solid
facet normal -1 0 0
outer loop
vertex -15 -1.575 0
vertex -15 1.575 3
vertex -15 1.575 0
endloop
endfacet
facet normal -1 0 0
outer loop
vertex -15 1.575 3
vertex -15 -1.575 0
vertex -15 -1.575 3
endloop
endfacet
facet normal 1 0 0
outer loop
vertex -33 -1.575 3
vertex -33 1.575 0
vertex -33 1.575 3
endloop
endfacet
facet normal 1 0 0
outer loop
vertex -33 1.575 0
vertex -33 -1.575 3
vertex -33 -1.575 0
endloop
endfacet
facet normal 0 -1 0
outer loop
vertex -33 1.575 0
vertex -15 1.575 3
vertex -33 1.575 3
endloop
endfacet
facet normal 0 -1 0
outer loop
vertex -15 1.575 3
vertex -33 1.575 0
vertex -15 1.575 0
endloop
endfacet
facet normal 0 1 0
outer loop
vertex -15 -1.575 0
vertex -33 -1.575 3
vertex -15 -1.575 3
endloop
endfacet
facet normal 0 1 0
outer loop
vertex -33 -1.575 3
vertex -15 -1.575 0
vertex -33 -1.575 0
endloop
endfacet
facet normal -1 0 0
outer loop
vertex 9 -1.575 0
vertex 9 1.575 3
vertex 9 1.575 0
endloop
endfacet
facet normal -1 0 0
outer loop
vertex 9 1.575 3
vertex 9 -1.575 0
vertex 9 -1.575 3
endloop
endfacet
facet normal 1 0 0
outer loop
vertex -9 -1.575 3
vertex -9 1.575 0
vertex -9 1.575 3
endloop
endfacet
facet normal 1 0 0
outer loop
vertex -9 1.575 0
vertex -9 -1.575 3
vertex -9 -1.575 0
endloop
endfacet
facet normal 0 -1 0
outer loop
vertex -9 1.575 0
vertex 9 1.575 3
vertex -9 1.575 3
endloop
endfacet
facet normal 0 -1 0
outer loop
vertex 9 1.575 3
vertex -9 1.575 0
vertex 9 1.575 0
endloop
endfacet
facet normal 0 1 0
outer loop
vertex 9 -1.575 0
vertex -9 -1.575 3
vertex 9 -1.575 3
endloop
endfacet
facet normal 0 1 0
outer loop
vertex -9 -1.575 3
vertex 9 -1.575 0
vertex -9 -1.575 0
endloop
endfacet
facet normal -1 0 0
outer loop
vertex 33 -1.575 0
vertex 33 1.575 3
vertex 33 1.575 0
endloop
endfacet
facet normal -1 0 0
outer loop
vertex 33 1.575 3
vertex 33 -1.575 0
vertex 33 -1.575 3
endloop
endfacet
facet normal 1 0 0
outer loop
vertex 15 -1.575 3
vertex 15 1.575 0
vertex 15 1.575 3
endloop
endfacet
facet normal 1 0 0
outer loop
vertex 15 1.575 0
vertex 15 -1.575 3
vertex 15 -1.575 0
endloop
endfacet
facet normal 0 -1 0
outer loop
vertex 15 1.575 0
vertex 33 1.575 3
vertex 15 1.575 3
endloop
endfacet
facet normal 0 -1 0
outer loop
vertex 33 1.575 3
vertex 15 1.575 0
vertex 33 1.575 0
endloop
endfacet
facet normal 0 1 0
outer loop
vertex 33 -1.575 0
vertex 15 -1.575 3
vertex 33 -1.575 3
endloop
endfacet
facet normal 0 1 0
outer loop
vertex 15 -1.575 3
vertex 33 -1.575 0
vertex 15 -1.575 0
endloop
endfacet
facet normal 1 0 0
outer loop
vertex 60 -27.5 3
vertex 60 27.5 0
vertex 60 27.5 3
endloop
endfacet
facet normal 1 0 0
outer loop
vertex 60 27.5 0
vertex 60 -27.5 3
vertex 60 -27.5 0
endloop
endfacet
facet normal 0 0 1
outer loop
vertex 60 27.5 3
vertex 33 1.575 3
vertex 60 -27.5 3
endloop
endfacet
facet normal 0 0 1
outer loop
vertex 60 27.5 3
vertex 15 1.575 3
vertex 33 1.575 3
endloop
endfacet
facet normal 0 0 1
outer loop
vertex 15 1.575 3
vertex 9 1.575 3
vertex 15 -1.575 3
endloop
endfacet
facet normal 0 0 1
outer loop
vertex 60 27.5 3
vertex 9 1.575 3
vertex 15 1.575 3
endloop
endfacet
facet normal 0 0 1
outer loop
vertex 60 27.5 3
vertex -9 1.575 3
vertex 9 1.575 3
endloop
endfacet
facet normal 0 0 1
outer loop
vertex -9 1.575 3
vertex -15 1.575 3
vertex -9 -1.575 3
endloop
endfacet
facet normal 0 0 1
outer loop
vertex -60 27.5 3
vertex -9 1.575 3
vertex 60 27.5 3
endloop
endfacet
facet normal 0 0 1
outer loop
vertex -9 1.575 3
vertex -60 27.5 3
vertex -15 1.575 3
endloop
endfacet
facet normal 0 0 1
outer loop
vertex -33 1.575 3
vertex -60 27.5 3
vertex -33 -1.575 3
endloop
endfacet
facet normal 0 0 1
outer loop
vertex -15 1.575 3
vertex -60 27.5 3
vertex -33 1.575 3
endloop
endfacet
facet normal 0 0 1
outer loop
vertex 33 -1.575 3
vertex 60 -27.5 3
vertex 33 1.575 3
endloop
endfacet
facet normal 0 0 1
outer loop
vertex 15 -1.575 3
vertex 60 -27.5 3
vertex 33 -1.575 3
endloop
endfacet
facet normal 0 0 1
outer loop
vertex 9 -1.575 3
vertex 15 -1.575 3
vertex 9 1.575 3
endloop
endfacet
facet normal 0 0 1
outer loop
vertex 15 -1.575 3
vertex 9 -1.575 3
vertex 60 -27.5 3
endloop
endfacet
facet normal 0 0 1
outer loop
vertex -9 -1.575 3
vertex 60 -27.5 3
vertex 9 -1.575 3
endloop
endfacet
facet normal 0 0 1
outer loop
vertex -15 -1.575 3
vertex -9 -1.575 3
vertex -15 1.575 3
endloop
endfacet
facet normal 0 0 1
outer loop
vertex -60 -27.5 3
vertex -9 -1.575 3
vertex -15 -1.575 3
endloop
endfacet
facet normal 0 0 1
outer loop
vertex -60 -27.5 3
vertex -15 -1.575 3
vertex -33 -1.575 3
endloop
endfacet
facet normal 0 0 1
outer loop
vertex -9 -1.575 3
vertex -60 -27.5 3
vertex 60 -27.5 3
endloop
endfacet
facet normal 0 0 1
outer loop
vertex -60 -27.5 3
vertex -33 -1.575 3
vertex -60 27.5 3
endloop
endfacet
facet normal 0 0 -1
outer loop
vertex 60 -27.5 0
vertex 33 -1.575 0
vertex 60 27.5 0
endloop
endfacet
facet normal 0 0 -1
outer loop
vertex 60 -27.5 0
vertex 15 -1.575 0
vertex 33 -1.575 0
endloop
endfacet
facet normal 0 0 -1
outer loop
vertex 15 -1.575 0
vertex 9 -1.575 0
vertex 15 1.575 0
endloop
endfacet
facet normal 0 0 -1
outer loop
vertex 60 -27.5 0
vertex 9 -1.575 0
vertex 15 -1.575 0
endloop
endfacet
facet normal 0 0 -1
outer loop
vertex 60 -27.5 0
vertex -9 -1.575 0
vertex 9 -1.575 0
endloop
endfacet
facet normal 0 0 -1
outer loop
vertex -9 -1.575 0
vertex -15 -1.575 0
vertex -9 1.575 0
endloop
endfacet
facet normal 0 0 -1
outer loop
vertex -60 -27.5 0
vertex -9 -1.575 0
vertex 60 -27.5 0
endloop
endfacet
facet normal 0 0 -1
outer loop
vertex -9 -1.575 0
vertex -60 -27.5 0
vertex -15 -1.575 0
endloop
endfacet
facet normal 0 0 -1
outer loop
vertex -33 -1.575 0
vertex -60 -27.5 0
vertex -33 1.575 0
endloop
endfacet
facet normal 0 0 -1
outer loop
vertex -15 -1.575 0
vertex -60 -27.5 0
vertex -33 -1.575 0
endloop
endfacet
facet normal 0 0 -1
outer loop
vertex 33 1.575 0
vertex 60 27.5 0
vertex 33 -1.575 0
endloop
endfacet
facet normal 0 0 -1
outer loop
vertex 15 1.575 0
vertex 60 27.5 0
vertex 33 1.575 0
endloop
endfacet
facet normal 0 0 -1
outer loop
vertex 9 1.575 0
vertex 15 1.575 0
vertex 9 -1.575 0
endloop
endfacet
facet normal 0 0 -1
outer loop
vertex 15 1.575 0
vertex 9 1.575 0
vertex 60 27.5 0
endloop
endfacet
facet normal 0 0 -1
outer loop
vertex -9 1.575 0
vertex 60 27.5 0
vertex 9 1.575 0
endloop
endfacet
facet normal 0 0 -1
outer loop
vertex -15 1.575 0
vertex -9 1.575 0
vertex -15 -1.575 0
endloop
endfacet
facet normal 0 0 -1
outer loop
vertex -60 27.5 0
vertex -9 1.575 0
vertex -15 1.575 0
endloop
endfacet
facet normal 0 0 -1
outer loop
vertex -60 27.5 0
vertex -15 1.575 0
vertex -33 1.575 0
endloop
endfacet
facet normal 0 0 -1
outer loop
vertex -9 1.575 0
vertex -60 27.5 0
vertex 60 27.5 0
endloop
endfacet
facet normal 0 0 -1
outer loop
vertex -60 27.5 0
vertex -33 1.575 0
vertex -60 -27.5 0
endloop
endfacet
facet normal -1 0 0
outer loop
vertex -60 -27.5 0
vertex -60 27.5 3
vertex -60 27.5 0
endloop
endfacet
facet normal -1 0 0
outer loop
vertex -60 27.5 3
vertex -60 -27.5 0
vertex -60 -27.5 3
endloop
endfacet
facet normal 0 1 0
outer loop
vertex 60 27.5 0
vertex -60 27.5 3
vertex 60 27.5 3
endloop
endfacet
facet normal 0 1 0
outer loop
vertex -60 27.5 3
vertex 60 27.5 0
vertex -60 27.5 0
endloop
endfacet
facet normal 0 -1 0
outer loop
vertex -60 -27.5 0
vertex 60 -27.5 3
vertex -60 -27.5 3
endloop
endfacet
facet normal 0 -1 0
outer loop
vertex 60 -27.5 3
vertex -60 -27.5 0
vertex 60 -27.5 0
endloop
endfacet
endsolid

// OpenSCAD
material_thickness_mm = 3.0;
kerf_mm = 0.2;

panel_length_mm = 120;
panel_width_mm = 55;

slot_count = 3;
slot_length_mm = 18;
slot_width_mm = 3.15;
min_web_mm = 6.0;

slot_pitch_mm = slot_length_mm + min_web_mm;
slot_centers_x = [-slot_pitch_mm, 0, slot_pitch_mm];

echo(str("MAKERBENCH-LASER2D: {\"material_thickness_mm\": ", material_thickness_mm,
         ", \"kerf_mm\": ", kerf_mm,
         ", \"slot_count\": ", slot_count,
         ", \"slot_length_mm\": ", slot_length_mm,
         ", \"slot_width_mm\": ", slot_width_mm,
         ", \"min_web_mm\": ", min_web_mm, "}"));

difference() {
    translate([-panel_length_mm / 2, -panel_width_mm / 2, 0])
        cube([panel_length_mm, panel_width_mm, material_thickness_mm]);

    for (x = slot_centers_x) {
        translate([x - slot_length_mm / 2,
                   -slot_width_mm / 2,
                   -0.1])
            cube([slot_length_mm, slot_width_mm, material_thickness_mm + 0.2]);
    }
}
